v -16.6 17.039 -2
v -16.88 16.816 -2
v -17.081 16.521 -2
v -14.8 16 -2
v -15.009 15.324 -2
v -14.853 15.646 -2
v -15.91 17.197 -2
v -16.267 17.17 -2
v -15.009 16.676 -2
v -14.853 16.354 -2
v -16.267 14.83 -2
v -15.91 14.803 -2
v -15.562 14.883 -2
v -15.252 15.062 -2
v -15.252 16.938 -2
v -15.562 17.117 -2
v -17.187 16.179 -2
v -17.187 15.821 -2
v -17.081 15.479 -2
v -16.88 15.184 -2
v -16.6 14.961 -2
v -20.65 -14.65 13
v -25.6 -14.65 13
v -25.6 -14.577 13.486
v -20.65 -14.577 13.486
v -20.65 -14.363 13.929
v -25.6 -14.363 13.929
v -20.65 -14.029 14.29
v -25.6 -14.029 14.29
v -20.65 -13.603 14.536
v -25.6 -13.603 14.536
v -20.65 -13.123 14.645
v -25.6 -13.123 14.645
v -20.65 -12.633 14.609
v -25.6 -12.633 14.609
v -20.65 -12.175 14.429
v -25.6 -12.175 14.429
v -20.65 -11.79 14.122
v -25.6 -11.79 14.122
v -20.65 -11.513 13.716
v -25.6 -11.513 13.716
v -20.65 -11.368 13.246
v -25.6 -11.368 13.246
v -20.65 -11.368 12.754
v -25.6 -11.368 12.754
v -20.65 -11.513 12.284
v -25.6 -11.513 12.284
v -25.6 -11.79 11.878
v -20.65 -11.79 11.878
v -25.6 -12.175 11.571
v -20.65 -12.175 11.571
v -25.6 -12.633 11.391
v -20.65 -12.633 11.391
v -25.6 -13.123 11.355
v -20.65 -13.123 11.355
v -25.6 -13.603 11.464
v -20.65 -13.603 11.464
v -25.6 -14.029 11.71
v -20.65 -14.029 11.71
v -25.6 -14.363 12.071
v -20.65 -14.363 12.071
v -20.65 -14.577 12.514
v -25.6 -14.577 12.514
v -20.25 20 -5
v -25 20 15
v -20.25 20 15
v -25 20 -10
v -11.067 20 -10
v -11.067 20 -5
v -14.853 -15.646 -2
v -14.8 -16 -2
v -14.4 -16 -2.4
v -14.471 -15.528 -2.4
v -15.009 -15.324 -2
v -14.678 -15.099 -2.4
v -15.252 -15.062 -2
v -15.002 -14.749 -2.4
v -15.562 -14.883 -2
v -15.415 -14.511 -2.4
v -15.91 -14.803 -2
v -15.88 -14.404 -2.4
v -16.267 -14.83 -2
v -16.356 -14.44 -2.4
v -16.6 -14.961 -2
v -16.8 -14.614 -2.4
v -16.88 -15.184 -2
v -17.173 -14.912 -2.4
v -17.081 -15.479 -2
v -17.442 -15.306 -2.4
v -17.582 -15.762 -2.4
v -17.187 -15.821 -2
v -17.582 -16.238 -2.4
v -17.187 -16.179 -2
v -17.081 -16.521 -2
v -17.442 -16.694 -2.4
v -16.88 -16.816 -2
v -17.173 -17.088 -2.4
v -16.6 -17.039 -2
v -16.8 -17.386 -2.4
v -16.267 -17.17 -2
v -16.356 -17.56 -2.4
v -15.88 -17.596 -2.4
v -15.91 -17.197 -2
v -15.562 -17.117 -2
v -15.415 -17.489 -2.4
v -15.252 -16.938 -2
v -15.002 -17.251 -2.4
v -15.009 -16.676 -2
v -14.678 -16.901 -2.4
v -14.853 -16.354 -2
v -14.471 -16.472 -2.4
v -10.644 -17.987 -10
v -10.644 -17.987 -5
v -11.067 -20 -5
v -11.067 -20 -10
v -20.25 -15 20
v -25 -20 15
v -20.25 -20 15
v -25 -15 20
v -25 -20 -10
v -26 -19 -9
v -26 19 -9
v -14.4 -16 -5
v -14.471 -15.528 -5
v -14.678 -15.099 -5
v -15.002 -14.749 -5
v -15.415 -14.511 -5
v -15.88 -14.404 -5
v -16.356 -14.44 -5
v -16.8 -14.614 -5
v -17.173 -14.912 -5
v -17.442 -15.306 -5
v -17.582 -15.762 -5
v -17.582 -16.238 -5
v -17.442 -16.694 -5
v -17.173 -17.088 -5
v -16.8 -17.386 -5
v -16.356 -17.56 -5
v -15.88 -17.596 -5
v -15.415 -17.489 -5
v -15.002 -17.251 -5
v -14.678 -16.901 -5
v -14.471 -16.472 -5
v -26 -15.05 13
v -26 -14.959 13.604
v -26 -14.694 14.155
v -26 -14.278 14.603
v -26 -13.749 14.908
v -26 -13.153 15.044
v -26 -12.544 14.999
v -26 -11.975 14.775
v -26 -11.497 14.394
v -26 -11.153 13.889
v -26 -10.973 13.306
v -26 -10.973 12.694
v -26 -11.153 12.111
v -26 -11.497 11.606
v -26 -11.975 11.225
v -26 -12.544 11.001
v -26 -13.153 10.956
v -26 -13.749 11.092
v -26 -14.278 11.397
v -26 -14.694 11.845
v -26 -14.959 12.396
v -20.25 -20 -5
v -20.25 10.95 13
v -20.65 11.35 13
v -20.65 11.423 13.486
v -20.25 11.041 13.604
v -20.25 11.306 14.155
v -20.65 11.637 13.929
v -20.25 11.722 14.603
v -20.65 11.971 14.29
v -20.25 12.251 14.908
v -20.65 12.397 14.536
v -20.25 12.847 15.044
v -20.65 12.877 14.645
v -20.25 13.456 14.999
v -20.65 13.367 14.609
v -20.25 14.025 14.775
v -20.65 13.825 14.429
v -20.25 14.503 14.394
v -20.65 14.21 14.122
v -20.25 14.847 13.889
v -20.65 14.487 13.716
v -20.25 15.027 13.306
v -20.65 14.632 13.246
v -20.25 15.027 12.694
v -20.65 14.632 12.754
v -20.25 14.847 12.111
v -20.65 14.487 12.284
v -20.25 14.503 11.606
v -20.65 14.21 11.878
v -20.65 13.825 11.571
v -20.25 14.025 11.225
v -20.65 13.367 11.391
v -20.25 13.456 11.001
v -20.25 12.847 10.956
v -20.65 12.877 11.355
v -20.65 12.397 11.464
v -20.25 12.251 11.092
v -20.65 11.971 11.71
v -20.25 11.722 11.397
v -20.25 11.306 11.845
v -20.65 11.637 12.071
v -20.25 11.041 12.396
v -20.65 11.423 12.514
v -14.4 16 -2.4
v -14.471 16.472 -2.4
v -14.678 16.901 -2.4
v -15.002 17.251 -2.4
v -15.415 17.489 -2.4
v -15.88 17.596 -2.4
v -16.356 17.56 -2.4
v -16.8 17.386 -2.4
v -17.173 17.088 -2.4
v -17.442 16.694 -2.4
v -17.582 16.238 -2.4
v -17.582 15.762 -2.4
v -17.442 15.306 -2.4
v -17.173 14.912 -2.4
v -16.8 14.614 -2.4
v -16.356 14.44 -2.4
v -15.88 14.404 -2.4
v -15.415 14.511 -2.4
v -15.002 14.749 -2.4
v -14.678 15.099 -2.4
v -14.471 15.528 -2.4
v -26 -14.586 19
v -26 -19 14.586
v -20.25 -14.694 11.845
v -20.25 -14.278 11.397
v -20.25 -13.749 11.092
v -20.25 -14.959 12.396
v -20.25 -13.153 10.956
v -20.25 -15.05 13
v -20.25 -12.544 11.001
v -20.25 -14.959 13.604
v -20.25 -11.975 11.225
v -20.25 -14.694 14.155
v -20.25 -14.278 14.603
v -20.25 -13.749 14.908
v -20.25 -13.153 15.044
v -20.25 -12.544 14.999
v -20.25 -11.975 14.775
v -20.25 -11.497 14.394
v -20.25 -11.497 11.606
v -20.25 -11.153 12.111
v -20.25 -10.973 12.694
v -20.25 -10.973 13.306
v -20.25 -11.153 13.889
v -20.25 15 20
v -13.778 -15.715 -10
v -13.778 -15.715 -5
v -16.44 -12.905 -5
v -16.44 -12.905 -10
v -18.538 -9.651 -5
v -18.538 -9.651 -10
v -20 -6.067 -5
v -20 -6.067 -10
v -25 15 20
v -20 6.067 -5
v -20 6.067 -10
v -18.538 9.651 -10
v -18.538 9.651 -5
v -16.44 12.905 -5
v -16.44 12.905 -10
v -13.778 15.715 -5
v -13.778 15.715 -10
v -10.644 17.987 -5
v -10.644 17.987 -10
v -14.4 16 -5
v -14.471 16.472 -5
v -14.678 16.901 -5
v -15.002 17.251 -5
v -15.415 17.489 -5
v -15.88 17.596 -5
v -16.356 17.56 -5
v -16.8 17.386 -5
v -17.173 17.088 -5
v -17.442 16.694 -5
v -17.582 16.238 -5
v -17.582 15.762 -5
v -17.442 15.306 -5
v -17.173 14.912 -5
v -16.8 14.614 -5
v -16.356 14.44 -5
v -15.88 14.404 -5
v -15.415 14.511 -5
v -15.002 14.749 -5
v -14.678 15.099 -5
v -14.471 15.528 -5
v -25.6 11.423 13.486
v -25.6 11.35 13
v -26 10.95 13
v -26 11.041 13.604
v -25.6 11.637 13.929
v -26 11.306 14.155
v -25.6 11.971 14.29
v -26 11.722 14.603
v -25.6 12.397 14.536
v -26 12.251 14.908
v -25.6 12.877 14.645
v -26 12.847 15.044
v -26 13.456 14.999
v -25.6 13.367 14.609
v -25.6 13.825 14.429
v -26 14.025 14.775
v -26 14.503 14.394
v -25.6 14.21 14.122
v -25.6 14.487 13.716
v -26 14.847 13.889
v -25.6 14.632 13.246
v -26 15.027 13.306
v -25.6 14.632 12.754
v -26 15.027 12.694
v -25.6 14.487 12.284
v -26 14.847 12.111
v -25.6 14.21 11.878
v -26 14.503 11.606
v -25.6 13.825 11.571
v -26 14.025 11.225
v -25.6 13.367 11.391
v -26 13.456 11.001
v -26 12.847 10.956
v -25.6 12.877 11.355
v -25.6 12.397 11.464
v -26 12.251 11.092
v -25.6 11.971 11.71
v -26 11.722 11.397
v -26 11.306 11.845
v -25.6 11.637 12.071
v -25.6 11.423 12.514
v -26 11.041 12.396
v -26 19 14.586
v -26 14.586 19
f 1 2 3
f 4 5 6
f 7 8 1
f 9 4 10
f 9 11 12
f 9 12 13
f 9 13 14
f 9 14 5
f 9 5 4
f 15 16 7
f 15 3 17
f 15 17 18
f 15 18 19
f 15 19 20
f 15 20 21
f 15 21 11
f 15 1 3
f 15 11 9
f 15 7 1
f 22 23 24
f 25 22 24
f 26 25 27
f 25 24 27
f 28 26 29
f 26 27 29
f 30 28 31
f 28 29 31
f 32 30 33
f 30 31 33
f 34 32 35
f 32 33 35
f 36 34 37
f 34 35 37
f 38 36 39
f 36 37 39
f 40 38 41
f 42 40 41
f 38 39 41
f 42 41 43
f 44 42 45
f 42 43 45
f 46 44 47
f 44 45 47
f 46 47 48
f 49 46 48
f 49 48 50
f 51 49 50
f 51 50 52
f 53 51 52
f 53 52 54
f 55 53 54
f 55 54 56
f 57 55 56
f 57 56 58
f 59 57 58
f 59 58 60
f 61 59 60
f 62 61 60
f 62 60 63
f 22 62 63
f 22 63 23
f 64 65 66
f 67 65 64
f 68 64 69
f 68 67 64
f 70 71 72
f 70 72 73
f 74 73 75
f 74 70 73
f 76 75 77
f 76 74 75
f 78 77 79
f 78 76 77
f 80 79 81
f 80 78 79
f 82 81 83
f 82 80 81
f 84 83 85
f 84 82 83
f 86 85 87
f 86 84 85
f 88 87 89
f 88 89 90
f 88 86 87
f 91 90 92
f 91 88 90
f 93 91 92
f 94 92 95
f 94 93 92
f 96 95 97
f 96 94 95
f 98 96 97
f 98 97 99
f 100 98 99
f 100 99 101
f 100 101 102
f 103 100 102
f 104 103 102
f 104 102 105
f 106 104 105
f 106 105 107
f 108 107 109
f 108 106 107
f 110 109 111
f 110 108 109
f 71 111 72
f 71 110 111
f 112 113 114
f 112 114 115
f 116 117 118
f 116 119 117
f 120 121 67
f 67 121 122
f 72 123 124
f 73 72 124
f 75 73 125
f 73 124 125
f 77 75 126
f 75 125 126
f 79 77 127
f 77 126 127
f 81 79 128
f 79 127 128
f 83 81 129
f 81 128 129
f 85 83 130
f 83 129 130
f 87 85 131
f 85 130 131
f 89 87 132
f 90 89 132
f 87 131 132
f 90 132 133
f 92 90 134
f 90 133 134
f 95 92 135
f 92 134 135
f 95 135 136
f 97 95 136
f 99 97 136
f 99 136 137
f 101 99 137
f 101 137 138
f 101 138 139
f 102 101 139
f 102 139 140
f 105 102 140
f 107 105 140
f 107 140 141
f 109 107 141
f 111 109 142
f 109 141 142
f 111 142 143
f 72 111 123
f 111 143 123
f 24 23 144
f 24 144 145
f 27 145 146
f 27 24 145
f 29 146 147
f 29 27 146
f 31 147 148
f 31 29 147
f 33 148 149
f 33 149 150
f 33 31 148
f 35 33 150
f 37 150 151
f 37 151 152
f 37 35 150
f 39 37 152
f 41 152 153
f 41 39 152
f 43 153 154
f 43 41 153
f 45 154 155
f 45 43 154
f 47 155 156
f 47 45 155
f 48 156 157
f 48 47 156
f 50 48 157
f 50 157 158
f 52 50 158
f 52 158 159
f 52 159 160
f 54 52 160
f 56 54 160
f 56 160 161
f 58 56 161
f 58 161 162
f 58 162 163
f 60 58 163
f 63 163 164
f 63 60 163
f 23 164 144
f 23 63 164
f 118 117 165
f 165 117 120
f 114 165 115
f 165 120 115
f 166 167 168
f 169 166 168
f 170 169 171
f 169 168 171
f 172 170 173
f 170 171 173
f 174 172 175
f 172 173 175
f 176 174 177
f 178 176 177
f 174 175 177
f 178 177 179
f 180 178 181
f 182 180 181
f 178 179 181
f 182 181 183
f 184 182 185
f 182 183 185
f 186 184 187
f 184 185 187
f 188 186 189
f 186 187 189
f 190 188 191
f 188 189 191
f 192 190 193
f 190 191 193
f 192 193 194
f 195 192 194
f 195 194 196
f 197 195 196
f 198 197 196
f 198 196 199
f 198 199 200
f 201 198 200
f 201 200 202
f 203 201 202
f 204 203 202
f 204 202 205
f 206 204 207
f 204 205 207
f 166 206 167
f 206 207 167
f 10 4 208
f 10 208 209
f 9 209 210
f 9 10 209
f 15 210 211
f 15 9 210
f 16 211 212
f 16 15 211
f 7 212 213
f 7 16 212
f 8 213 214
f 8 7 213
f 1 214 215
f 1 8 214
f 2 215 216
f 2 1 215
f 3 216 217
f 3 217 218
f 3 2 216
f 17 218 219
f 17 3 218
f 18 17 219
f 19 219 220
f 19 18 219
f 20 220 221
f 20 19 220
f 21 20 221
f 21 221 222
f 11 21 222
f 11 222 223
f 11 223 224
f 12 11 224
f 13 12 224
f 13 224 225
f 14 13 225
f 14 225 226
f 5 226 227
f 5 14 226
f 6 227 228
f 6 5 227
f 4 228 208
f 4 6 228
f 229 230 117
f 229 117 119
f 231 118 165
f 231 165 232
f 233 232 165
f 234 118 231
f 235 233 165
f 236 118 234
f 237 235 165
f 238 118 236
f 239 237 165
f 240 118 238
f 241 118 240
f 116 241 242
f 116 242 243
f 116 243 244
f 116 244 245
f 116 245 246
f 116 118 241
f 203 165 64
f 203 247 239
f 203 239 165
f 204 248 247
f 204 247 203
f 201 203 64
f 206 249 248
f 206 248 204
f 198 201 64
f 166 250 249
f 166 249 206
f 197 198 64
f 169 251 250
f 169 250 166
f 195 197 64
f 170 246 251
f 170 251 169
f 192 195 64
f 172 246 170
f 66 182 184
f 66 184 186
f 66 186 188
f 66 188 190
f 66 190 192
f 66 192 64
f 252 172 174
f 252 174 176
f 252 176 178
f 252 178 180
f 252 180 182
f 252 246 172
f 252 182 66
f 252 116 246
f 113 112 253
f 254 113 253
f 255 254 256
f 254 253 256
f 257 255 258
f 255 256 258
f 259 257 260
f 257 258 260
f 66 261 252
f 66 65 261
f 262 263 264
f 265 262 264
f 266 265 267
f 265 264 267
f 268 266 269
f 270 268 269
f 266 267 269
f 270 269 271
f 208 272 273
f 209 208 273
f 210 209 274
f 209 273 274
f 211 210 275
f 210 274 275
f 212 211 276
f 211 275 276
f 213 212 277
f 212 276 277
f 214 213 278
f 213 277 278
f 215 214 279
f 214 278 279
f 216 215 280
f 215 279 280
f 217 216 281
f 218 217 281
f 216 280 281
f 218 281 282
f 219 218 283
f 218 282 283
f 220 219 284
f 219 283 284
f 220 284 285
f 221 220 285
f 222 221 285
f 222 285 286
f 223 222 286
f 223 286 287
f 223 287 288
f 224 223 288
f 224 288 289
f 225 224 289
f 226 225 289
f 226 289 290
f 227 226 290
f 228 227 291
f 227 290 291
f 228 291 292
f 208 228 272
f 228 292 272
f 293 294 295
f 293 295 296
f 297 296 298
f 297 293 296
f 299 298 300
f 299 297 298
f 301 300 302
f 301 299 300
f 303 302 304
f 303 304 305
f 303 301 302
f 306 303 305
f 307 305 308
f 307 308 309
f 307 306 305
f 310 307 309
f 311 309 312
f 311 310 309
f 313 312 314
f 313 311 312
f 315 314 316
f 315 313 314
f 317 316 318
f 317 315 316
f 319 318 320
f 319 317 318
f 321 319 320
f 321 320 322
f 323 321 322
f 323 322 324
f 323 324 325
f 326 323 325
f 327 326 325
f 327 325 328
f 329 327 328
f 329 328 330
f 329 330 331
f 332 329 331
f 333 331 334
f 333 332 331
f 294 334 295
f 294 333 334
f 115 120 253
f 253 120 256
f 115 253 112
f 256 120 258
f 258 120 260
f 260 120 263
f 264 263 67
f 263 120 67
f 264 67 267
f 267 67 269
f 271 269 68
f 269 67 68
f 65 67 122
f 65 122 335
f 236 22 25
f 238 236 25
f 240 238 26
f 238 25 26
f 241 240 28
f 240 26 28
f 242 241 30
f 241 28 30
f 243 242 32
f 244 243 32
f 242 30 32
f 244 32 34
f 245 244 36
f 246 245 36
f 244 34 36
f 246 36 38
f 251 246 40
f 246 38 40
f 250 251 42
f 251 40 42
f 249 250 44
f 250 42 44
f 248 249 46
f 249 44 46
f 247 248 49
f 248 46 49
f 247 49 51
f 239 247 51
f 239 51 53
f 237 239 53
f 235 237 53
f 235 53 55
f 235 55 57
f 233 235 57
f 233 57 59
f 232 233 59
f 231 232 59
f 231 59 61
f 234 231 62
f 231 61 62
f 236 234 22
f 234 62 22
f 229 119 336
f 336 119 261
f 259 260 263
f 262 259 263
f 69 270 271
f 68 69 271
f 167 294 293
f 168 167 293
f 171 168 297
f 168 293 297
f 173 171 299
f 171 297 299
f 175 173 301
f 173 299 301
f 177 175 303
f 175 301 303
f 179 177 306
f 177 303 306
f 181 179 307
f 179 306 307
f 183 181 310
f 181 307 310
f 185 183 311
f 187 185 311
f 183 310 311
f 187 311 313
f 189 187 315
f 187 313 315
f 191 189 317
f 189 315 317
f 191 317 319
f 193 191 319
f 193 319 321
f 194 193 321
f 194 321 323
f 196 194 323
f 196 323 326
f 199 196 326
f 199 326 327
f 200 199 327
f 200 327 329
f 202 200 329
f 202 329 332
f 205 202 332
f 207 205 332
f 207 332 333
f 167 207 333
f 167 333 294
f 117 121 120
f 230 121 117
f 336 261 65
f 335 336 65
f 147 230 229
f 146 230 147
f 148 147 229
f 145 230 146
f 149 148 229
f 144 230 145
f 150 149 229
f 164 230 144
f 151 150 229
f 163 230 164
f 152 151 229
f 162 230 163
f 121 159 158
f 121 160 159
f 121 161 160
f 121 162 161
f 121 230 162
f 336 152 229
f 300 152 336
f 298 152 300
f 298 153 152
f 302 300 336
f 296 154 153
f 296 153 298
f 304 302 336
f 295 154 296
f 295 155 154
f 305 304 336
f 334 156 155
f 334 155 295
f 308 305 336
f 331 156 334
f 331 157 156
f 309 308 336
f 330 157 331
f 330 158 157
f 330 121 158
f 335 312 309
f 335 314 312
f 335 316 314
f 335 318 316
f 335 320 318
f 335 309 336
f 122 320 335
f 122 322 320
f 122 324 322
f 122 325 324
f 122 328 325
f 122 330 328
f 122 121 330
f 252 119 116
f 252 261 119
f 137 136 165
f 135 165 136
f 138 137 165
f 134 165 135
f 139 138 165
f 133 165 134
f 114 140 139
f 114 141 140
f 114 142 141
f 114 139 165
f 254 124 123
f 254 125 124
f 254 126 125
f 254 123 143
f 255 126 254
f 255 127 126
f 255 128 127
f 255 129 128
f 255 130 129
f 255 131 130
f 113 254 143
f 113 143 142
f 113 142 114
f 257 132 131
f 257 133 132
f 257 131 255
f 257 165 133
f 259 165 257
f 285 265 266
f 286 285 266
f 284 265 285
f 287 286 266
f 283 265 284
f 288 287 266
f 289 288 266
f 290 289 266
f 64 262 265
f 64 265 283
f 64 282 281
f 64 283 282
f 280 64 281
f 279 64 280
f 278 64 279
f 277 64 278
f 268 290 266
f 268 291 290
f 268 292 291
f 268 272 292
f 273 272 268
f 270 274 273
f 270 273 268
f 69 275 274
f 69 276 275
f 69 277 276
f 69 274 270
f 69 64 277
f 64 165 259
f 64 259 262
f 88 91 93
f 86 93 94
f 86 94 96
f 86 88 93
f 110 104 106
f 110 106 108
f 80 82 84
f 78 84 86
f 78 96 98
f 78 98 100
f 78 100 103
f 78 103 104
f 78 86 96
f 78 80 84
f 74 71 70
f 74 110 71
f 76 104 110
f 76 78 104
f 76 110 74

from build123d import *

# Parameters (mm, degrees)
SKETCH105_W              = 21
SKETCH105_H              = 40
PAD032_DEPTH             = 30
POCKET067_DEPTH          = 5
SKETCH107_W              = 20.25
SKETCH107_H              = 40
POCKET068_DEPTH          = 25
SKETCH108_R              = 1.6
PAD033_DEPTH             = 3
SKETCH109_R              = 1.65
POCKET069_DEPTH          = 19.933875
CHAMFER009002001006_SIZE = 5
CHAMFER009002001007_SIZE = 5
CHAMFER009002001008_SIZE = 1
CHAMFER009002001009_SIZE = 0.4


with BuildPart() as part:
    # Sketch105 → Pad032 (new body)
    with BuildSketch(Plane.XY):
        with Locations((-15.5, 0)):
            Rectangle(SKETCH105_W, SKETCH105_H)
    extrude(amount=PAD032_DEPTH)

    # Sketch106 (on Face5 of Pad032) → Pocket067 (cut)
    with BuildSketch(Plane(origin=(0, 0, 0), x_dir=(1, 0, 0), z_dir=(0, 0, -1))):
        with BuildLine():
            ThreePointArc((-20, -6.067125), (20.9, 0), (-20, 6.067125))
            Line((-20, 6.067125), (-20, -6.067125))
        make_face()
    extrude(amount=-POCKET067_DEPTH, mode=Mode.SUBTRACT)

    # Sketch107 (on Face6 of Pocket067) → Pocket068 (cut)
    with BuildSketch(Plane.XY.offset(30)):
        with Locations((-10.125, 0)):
            Rectangle(SKETCH107_W, SKETCH107_H)
    extrude(amount=-POCKET068_DEPTH, mode=Mode.SUBTRACT)

    # Sketch108 (on Face4 of Pocket068) → Pad033 (join)
    with BuildSketch(Plane.XY.offset(5)):
        with Locations((-16, 16)):
            Circle(SKETCH108_R)
        with Locations((-16, -16)):
            Circle(SKETCH108_R)
    extrude(amount=PAD033_DEPTH)

    # Sketch109 (on Face7 of Pad033) → Pocket069 (cut, through all)
    with BuildSketch(Plane(origin=(-26, 0, 0), x_dir=(0, -1, 0), z_dir=(-1, 0, 0))):
        with Locations((-13, 23)):
            Circle(SKETCH109_R)
        with Locations((13, 23)):
            Circle(SKETCH109_R)
    extrude(amount=-POCKET069_DEPTH, mode=Mode.SUBTRACT)

    # Chamfer009002001006
    chamfer009002001006_edges = [part.edges().sort_by_distance(p)[0] for p in [
        (-23.125, 20, 30),
        (-23.125, -20, 30),
    ]]
    chamfer(chamfer009002001006_edges, length=CHAMFER009002001006_SIZE)

    # Chamfer009002001007
    chamfer009002001007_edges = [part.edges().sort_by_distance(p)[0] for p in [
        (-6.067125, -20, 2.5),
        (-6.067125, 20, 2.5),
    ]]
    chamfer(chamfer009002001007_edges, length=CHAMFER009002001007_SIZE)

    # Chamfer009002001008
    chamfer009002001008_edges = [part.edges().sort_by_distance(p)[0] for p in [
        (-26, 0, 0),
        (-26, 20, 12.5),
        (-26, 17.5, 27.5),
        (-26, 0, 30),
        (-26, -17.5, 27.5),
        (-26, -20, 12.5),
    ]]
    chamfer(chamfer009002001008_edges, length=CHAMFER009002001008_SIZE)

    # Chamfer009002001009
    chamfer009002001009_edges = [part.edges().sort_by_distance(p)[0] for p in [
        (-26, 14.65, 23),
        (-26, -11.35, 23),
        (-17.6, -16, 8),
        (-17.6, 16, 8),
        (-20.25, 14.65, 23),
        (-20.25, -11.35, 23),
    ]]
    chamfer(chamfer009002001009_edges, length=CHAMFER009002001009_SIZE)


with BuildPart() as part_1:
    # Body012 placement: moved
    add(part.part.moved(Location((0, 0, -10))))


solid = part_1.part
